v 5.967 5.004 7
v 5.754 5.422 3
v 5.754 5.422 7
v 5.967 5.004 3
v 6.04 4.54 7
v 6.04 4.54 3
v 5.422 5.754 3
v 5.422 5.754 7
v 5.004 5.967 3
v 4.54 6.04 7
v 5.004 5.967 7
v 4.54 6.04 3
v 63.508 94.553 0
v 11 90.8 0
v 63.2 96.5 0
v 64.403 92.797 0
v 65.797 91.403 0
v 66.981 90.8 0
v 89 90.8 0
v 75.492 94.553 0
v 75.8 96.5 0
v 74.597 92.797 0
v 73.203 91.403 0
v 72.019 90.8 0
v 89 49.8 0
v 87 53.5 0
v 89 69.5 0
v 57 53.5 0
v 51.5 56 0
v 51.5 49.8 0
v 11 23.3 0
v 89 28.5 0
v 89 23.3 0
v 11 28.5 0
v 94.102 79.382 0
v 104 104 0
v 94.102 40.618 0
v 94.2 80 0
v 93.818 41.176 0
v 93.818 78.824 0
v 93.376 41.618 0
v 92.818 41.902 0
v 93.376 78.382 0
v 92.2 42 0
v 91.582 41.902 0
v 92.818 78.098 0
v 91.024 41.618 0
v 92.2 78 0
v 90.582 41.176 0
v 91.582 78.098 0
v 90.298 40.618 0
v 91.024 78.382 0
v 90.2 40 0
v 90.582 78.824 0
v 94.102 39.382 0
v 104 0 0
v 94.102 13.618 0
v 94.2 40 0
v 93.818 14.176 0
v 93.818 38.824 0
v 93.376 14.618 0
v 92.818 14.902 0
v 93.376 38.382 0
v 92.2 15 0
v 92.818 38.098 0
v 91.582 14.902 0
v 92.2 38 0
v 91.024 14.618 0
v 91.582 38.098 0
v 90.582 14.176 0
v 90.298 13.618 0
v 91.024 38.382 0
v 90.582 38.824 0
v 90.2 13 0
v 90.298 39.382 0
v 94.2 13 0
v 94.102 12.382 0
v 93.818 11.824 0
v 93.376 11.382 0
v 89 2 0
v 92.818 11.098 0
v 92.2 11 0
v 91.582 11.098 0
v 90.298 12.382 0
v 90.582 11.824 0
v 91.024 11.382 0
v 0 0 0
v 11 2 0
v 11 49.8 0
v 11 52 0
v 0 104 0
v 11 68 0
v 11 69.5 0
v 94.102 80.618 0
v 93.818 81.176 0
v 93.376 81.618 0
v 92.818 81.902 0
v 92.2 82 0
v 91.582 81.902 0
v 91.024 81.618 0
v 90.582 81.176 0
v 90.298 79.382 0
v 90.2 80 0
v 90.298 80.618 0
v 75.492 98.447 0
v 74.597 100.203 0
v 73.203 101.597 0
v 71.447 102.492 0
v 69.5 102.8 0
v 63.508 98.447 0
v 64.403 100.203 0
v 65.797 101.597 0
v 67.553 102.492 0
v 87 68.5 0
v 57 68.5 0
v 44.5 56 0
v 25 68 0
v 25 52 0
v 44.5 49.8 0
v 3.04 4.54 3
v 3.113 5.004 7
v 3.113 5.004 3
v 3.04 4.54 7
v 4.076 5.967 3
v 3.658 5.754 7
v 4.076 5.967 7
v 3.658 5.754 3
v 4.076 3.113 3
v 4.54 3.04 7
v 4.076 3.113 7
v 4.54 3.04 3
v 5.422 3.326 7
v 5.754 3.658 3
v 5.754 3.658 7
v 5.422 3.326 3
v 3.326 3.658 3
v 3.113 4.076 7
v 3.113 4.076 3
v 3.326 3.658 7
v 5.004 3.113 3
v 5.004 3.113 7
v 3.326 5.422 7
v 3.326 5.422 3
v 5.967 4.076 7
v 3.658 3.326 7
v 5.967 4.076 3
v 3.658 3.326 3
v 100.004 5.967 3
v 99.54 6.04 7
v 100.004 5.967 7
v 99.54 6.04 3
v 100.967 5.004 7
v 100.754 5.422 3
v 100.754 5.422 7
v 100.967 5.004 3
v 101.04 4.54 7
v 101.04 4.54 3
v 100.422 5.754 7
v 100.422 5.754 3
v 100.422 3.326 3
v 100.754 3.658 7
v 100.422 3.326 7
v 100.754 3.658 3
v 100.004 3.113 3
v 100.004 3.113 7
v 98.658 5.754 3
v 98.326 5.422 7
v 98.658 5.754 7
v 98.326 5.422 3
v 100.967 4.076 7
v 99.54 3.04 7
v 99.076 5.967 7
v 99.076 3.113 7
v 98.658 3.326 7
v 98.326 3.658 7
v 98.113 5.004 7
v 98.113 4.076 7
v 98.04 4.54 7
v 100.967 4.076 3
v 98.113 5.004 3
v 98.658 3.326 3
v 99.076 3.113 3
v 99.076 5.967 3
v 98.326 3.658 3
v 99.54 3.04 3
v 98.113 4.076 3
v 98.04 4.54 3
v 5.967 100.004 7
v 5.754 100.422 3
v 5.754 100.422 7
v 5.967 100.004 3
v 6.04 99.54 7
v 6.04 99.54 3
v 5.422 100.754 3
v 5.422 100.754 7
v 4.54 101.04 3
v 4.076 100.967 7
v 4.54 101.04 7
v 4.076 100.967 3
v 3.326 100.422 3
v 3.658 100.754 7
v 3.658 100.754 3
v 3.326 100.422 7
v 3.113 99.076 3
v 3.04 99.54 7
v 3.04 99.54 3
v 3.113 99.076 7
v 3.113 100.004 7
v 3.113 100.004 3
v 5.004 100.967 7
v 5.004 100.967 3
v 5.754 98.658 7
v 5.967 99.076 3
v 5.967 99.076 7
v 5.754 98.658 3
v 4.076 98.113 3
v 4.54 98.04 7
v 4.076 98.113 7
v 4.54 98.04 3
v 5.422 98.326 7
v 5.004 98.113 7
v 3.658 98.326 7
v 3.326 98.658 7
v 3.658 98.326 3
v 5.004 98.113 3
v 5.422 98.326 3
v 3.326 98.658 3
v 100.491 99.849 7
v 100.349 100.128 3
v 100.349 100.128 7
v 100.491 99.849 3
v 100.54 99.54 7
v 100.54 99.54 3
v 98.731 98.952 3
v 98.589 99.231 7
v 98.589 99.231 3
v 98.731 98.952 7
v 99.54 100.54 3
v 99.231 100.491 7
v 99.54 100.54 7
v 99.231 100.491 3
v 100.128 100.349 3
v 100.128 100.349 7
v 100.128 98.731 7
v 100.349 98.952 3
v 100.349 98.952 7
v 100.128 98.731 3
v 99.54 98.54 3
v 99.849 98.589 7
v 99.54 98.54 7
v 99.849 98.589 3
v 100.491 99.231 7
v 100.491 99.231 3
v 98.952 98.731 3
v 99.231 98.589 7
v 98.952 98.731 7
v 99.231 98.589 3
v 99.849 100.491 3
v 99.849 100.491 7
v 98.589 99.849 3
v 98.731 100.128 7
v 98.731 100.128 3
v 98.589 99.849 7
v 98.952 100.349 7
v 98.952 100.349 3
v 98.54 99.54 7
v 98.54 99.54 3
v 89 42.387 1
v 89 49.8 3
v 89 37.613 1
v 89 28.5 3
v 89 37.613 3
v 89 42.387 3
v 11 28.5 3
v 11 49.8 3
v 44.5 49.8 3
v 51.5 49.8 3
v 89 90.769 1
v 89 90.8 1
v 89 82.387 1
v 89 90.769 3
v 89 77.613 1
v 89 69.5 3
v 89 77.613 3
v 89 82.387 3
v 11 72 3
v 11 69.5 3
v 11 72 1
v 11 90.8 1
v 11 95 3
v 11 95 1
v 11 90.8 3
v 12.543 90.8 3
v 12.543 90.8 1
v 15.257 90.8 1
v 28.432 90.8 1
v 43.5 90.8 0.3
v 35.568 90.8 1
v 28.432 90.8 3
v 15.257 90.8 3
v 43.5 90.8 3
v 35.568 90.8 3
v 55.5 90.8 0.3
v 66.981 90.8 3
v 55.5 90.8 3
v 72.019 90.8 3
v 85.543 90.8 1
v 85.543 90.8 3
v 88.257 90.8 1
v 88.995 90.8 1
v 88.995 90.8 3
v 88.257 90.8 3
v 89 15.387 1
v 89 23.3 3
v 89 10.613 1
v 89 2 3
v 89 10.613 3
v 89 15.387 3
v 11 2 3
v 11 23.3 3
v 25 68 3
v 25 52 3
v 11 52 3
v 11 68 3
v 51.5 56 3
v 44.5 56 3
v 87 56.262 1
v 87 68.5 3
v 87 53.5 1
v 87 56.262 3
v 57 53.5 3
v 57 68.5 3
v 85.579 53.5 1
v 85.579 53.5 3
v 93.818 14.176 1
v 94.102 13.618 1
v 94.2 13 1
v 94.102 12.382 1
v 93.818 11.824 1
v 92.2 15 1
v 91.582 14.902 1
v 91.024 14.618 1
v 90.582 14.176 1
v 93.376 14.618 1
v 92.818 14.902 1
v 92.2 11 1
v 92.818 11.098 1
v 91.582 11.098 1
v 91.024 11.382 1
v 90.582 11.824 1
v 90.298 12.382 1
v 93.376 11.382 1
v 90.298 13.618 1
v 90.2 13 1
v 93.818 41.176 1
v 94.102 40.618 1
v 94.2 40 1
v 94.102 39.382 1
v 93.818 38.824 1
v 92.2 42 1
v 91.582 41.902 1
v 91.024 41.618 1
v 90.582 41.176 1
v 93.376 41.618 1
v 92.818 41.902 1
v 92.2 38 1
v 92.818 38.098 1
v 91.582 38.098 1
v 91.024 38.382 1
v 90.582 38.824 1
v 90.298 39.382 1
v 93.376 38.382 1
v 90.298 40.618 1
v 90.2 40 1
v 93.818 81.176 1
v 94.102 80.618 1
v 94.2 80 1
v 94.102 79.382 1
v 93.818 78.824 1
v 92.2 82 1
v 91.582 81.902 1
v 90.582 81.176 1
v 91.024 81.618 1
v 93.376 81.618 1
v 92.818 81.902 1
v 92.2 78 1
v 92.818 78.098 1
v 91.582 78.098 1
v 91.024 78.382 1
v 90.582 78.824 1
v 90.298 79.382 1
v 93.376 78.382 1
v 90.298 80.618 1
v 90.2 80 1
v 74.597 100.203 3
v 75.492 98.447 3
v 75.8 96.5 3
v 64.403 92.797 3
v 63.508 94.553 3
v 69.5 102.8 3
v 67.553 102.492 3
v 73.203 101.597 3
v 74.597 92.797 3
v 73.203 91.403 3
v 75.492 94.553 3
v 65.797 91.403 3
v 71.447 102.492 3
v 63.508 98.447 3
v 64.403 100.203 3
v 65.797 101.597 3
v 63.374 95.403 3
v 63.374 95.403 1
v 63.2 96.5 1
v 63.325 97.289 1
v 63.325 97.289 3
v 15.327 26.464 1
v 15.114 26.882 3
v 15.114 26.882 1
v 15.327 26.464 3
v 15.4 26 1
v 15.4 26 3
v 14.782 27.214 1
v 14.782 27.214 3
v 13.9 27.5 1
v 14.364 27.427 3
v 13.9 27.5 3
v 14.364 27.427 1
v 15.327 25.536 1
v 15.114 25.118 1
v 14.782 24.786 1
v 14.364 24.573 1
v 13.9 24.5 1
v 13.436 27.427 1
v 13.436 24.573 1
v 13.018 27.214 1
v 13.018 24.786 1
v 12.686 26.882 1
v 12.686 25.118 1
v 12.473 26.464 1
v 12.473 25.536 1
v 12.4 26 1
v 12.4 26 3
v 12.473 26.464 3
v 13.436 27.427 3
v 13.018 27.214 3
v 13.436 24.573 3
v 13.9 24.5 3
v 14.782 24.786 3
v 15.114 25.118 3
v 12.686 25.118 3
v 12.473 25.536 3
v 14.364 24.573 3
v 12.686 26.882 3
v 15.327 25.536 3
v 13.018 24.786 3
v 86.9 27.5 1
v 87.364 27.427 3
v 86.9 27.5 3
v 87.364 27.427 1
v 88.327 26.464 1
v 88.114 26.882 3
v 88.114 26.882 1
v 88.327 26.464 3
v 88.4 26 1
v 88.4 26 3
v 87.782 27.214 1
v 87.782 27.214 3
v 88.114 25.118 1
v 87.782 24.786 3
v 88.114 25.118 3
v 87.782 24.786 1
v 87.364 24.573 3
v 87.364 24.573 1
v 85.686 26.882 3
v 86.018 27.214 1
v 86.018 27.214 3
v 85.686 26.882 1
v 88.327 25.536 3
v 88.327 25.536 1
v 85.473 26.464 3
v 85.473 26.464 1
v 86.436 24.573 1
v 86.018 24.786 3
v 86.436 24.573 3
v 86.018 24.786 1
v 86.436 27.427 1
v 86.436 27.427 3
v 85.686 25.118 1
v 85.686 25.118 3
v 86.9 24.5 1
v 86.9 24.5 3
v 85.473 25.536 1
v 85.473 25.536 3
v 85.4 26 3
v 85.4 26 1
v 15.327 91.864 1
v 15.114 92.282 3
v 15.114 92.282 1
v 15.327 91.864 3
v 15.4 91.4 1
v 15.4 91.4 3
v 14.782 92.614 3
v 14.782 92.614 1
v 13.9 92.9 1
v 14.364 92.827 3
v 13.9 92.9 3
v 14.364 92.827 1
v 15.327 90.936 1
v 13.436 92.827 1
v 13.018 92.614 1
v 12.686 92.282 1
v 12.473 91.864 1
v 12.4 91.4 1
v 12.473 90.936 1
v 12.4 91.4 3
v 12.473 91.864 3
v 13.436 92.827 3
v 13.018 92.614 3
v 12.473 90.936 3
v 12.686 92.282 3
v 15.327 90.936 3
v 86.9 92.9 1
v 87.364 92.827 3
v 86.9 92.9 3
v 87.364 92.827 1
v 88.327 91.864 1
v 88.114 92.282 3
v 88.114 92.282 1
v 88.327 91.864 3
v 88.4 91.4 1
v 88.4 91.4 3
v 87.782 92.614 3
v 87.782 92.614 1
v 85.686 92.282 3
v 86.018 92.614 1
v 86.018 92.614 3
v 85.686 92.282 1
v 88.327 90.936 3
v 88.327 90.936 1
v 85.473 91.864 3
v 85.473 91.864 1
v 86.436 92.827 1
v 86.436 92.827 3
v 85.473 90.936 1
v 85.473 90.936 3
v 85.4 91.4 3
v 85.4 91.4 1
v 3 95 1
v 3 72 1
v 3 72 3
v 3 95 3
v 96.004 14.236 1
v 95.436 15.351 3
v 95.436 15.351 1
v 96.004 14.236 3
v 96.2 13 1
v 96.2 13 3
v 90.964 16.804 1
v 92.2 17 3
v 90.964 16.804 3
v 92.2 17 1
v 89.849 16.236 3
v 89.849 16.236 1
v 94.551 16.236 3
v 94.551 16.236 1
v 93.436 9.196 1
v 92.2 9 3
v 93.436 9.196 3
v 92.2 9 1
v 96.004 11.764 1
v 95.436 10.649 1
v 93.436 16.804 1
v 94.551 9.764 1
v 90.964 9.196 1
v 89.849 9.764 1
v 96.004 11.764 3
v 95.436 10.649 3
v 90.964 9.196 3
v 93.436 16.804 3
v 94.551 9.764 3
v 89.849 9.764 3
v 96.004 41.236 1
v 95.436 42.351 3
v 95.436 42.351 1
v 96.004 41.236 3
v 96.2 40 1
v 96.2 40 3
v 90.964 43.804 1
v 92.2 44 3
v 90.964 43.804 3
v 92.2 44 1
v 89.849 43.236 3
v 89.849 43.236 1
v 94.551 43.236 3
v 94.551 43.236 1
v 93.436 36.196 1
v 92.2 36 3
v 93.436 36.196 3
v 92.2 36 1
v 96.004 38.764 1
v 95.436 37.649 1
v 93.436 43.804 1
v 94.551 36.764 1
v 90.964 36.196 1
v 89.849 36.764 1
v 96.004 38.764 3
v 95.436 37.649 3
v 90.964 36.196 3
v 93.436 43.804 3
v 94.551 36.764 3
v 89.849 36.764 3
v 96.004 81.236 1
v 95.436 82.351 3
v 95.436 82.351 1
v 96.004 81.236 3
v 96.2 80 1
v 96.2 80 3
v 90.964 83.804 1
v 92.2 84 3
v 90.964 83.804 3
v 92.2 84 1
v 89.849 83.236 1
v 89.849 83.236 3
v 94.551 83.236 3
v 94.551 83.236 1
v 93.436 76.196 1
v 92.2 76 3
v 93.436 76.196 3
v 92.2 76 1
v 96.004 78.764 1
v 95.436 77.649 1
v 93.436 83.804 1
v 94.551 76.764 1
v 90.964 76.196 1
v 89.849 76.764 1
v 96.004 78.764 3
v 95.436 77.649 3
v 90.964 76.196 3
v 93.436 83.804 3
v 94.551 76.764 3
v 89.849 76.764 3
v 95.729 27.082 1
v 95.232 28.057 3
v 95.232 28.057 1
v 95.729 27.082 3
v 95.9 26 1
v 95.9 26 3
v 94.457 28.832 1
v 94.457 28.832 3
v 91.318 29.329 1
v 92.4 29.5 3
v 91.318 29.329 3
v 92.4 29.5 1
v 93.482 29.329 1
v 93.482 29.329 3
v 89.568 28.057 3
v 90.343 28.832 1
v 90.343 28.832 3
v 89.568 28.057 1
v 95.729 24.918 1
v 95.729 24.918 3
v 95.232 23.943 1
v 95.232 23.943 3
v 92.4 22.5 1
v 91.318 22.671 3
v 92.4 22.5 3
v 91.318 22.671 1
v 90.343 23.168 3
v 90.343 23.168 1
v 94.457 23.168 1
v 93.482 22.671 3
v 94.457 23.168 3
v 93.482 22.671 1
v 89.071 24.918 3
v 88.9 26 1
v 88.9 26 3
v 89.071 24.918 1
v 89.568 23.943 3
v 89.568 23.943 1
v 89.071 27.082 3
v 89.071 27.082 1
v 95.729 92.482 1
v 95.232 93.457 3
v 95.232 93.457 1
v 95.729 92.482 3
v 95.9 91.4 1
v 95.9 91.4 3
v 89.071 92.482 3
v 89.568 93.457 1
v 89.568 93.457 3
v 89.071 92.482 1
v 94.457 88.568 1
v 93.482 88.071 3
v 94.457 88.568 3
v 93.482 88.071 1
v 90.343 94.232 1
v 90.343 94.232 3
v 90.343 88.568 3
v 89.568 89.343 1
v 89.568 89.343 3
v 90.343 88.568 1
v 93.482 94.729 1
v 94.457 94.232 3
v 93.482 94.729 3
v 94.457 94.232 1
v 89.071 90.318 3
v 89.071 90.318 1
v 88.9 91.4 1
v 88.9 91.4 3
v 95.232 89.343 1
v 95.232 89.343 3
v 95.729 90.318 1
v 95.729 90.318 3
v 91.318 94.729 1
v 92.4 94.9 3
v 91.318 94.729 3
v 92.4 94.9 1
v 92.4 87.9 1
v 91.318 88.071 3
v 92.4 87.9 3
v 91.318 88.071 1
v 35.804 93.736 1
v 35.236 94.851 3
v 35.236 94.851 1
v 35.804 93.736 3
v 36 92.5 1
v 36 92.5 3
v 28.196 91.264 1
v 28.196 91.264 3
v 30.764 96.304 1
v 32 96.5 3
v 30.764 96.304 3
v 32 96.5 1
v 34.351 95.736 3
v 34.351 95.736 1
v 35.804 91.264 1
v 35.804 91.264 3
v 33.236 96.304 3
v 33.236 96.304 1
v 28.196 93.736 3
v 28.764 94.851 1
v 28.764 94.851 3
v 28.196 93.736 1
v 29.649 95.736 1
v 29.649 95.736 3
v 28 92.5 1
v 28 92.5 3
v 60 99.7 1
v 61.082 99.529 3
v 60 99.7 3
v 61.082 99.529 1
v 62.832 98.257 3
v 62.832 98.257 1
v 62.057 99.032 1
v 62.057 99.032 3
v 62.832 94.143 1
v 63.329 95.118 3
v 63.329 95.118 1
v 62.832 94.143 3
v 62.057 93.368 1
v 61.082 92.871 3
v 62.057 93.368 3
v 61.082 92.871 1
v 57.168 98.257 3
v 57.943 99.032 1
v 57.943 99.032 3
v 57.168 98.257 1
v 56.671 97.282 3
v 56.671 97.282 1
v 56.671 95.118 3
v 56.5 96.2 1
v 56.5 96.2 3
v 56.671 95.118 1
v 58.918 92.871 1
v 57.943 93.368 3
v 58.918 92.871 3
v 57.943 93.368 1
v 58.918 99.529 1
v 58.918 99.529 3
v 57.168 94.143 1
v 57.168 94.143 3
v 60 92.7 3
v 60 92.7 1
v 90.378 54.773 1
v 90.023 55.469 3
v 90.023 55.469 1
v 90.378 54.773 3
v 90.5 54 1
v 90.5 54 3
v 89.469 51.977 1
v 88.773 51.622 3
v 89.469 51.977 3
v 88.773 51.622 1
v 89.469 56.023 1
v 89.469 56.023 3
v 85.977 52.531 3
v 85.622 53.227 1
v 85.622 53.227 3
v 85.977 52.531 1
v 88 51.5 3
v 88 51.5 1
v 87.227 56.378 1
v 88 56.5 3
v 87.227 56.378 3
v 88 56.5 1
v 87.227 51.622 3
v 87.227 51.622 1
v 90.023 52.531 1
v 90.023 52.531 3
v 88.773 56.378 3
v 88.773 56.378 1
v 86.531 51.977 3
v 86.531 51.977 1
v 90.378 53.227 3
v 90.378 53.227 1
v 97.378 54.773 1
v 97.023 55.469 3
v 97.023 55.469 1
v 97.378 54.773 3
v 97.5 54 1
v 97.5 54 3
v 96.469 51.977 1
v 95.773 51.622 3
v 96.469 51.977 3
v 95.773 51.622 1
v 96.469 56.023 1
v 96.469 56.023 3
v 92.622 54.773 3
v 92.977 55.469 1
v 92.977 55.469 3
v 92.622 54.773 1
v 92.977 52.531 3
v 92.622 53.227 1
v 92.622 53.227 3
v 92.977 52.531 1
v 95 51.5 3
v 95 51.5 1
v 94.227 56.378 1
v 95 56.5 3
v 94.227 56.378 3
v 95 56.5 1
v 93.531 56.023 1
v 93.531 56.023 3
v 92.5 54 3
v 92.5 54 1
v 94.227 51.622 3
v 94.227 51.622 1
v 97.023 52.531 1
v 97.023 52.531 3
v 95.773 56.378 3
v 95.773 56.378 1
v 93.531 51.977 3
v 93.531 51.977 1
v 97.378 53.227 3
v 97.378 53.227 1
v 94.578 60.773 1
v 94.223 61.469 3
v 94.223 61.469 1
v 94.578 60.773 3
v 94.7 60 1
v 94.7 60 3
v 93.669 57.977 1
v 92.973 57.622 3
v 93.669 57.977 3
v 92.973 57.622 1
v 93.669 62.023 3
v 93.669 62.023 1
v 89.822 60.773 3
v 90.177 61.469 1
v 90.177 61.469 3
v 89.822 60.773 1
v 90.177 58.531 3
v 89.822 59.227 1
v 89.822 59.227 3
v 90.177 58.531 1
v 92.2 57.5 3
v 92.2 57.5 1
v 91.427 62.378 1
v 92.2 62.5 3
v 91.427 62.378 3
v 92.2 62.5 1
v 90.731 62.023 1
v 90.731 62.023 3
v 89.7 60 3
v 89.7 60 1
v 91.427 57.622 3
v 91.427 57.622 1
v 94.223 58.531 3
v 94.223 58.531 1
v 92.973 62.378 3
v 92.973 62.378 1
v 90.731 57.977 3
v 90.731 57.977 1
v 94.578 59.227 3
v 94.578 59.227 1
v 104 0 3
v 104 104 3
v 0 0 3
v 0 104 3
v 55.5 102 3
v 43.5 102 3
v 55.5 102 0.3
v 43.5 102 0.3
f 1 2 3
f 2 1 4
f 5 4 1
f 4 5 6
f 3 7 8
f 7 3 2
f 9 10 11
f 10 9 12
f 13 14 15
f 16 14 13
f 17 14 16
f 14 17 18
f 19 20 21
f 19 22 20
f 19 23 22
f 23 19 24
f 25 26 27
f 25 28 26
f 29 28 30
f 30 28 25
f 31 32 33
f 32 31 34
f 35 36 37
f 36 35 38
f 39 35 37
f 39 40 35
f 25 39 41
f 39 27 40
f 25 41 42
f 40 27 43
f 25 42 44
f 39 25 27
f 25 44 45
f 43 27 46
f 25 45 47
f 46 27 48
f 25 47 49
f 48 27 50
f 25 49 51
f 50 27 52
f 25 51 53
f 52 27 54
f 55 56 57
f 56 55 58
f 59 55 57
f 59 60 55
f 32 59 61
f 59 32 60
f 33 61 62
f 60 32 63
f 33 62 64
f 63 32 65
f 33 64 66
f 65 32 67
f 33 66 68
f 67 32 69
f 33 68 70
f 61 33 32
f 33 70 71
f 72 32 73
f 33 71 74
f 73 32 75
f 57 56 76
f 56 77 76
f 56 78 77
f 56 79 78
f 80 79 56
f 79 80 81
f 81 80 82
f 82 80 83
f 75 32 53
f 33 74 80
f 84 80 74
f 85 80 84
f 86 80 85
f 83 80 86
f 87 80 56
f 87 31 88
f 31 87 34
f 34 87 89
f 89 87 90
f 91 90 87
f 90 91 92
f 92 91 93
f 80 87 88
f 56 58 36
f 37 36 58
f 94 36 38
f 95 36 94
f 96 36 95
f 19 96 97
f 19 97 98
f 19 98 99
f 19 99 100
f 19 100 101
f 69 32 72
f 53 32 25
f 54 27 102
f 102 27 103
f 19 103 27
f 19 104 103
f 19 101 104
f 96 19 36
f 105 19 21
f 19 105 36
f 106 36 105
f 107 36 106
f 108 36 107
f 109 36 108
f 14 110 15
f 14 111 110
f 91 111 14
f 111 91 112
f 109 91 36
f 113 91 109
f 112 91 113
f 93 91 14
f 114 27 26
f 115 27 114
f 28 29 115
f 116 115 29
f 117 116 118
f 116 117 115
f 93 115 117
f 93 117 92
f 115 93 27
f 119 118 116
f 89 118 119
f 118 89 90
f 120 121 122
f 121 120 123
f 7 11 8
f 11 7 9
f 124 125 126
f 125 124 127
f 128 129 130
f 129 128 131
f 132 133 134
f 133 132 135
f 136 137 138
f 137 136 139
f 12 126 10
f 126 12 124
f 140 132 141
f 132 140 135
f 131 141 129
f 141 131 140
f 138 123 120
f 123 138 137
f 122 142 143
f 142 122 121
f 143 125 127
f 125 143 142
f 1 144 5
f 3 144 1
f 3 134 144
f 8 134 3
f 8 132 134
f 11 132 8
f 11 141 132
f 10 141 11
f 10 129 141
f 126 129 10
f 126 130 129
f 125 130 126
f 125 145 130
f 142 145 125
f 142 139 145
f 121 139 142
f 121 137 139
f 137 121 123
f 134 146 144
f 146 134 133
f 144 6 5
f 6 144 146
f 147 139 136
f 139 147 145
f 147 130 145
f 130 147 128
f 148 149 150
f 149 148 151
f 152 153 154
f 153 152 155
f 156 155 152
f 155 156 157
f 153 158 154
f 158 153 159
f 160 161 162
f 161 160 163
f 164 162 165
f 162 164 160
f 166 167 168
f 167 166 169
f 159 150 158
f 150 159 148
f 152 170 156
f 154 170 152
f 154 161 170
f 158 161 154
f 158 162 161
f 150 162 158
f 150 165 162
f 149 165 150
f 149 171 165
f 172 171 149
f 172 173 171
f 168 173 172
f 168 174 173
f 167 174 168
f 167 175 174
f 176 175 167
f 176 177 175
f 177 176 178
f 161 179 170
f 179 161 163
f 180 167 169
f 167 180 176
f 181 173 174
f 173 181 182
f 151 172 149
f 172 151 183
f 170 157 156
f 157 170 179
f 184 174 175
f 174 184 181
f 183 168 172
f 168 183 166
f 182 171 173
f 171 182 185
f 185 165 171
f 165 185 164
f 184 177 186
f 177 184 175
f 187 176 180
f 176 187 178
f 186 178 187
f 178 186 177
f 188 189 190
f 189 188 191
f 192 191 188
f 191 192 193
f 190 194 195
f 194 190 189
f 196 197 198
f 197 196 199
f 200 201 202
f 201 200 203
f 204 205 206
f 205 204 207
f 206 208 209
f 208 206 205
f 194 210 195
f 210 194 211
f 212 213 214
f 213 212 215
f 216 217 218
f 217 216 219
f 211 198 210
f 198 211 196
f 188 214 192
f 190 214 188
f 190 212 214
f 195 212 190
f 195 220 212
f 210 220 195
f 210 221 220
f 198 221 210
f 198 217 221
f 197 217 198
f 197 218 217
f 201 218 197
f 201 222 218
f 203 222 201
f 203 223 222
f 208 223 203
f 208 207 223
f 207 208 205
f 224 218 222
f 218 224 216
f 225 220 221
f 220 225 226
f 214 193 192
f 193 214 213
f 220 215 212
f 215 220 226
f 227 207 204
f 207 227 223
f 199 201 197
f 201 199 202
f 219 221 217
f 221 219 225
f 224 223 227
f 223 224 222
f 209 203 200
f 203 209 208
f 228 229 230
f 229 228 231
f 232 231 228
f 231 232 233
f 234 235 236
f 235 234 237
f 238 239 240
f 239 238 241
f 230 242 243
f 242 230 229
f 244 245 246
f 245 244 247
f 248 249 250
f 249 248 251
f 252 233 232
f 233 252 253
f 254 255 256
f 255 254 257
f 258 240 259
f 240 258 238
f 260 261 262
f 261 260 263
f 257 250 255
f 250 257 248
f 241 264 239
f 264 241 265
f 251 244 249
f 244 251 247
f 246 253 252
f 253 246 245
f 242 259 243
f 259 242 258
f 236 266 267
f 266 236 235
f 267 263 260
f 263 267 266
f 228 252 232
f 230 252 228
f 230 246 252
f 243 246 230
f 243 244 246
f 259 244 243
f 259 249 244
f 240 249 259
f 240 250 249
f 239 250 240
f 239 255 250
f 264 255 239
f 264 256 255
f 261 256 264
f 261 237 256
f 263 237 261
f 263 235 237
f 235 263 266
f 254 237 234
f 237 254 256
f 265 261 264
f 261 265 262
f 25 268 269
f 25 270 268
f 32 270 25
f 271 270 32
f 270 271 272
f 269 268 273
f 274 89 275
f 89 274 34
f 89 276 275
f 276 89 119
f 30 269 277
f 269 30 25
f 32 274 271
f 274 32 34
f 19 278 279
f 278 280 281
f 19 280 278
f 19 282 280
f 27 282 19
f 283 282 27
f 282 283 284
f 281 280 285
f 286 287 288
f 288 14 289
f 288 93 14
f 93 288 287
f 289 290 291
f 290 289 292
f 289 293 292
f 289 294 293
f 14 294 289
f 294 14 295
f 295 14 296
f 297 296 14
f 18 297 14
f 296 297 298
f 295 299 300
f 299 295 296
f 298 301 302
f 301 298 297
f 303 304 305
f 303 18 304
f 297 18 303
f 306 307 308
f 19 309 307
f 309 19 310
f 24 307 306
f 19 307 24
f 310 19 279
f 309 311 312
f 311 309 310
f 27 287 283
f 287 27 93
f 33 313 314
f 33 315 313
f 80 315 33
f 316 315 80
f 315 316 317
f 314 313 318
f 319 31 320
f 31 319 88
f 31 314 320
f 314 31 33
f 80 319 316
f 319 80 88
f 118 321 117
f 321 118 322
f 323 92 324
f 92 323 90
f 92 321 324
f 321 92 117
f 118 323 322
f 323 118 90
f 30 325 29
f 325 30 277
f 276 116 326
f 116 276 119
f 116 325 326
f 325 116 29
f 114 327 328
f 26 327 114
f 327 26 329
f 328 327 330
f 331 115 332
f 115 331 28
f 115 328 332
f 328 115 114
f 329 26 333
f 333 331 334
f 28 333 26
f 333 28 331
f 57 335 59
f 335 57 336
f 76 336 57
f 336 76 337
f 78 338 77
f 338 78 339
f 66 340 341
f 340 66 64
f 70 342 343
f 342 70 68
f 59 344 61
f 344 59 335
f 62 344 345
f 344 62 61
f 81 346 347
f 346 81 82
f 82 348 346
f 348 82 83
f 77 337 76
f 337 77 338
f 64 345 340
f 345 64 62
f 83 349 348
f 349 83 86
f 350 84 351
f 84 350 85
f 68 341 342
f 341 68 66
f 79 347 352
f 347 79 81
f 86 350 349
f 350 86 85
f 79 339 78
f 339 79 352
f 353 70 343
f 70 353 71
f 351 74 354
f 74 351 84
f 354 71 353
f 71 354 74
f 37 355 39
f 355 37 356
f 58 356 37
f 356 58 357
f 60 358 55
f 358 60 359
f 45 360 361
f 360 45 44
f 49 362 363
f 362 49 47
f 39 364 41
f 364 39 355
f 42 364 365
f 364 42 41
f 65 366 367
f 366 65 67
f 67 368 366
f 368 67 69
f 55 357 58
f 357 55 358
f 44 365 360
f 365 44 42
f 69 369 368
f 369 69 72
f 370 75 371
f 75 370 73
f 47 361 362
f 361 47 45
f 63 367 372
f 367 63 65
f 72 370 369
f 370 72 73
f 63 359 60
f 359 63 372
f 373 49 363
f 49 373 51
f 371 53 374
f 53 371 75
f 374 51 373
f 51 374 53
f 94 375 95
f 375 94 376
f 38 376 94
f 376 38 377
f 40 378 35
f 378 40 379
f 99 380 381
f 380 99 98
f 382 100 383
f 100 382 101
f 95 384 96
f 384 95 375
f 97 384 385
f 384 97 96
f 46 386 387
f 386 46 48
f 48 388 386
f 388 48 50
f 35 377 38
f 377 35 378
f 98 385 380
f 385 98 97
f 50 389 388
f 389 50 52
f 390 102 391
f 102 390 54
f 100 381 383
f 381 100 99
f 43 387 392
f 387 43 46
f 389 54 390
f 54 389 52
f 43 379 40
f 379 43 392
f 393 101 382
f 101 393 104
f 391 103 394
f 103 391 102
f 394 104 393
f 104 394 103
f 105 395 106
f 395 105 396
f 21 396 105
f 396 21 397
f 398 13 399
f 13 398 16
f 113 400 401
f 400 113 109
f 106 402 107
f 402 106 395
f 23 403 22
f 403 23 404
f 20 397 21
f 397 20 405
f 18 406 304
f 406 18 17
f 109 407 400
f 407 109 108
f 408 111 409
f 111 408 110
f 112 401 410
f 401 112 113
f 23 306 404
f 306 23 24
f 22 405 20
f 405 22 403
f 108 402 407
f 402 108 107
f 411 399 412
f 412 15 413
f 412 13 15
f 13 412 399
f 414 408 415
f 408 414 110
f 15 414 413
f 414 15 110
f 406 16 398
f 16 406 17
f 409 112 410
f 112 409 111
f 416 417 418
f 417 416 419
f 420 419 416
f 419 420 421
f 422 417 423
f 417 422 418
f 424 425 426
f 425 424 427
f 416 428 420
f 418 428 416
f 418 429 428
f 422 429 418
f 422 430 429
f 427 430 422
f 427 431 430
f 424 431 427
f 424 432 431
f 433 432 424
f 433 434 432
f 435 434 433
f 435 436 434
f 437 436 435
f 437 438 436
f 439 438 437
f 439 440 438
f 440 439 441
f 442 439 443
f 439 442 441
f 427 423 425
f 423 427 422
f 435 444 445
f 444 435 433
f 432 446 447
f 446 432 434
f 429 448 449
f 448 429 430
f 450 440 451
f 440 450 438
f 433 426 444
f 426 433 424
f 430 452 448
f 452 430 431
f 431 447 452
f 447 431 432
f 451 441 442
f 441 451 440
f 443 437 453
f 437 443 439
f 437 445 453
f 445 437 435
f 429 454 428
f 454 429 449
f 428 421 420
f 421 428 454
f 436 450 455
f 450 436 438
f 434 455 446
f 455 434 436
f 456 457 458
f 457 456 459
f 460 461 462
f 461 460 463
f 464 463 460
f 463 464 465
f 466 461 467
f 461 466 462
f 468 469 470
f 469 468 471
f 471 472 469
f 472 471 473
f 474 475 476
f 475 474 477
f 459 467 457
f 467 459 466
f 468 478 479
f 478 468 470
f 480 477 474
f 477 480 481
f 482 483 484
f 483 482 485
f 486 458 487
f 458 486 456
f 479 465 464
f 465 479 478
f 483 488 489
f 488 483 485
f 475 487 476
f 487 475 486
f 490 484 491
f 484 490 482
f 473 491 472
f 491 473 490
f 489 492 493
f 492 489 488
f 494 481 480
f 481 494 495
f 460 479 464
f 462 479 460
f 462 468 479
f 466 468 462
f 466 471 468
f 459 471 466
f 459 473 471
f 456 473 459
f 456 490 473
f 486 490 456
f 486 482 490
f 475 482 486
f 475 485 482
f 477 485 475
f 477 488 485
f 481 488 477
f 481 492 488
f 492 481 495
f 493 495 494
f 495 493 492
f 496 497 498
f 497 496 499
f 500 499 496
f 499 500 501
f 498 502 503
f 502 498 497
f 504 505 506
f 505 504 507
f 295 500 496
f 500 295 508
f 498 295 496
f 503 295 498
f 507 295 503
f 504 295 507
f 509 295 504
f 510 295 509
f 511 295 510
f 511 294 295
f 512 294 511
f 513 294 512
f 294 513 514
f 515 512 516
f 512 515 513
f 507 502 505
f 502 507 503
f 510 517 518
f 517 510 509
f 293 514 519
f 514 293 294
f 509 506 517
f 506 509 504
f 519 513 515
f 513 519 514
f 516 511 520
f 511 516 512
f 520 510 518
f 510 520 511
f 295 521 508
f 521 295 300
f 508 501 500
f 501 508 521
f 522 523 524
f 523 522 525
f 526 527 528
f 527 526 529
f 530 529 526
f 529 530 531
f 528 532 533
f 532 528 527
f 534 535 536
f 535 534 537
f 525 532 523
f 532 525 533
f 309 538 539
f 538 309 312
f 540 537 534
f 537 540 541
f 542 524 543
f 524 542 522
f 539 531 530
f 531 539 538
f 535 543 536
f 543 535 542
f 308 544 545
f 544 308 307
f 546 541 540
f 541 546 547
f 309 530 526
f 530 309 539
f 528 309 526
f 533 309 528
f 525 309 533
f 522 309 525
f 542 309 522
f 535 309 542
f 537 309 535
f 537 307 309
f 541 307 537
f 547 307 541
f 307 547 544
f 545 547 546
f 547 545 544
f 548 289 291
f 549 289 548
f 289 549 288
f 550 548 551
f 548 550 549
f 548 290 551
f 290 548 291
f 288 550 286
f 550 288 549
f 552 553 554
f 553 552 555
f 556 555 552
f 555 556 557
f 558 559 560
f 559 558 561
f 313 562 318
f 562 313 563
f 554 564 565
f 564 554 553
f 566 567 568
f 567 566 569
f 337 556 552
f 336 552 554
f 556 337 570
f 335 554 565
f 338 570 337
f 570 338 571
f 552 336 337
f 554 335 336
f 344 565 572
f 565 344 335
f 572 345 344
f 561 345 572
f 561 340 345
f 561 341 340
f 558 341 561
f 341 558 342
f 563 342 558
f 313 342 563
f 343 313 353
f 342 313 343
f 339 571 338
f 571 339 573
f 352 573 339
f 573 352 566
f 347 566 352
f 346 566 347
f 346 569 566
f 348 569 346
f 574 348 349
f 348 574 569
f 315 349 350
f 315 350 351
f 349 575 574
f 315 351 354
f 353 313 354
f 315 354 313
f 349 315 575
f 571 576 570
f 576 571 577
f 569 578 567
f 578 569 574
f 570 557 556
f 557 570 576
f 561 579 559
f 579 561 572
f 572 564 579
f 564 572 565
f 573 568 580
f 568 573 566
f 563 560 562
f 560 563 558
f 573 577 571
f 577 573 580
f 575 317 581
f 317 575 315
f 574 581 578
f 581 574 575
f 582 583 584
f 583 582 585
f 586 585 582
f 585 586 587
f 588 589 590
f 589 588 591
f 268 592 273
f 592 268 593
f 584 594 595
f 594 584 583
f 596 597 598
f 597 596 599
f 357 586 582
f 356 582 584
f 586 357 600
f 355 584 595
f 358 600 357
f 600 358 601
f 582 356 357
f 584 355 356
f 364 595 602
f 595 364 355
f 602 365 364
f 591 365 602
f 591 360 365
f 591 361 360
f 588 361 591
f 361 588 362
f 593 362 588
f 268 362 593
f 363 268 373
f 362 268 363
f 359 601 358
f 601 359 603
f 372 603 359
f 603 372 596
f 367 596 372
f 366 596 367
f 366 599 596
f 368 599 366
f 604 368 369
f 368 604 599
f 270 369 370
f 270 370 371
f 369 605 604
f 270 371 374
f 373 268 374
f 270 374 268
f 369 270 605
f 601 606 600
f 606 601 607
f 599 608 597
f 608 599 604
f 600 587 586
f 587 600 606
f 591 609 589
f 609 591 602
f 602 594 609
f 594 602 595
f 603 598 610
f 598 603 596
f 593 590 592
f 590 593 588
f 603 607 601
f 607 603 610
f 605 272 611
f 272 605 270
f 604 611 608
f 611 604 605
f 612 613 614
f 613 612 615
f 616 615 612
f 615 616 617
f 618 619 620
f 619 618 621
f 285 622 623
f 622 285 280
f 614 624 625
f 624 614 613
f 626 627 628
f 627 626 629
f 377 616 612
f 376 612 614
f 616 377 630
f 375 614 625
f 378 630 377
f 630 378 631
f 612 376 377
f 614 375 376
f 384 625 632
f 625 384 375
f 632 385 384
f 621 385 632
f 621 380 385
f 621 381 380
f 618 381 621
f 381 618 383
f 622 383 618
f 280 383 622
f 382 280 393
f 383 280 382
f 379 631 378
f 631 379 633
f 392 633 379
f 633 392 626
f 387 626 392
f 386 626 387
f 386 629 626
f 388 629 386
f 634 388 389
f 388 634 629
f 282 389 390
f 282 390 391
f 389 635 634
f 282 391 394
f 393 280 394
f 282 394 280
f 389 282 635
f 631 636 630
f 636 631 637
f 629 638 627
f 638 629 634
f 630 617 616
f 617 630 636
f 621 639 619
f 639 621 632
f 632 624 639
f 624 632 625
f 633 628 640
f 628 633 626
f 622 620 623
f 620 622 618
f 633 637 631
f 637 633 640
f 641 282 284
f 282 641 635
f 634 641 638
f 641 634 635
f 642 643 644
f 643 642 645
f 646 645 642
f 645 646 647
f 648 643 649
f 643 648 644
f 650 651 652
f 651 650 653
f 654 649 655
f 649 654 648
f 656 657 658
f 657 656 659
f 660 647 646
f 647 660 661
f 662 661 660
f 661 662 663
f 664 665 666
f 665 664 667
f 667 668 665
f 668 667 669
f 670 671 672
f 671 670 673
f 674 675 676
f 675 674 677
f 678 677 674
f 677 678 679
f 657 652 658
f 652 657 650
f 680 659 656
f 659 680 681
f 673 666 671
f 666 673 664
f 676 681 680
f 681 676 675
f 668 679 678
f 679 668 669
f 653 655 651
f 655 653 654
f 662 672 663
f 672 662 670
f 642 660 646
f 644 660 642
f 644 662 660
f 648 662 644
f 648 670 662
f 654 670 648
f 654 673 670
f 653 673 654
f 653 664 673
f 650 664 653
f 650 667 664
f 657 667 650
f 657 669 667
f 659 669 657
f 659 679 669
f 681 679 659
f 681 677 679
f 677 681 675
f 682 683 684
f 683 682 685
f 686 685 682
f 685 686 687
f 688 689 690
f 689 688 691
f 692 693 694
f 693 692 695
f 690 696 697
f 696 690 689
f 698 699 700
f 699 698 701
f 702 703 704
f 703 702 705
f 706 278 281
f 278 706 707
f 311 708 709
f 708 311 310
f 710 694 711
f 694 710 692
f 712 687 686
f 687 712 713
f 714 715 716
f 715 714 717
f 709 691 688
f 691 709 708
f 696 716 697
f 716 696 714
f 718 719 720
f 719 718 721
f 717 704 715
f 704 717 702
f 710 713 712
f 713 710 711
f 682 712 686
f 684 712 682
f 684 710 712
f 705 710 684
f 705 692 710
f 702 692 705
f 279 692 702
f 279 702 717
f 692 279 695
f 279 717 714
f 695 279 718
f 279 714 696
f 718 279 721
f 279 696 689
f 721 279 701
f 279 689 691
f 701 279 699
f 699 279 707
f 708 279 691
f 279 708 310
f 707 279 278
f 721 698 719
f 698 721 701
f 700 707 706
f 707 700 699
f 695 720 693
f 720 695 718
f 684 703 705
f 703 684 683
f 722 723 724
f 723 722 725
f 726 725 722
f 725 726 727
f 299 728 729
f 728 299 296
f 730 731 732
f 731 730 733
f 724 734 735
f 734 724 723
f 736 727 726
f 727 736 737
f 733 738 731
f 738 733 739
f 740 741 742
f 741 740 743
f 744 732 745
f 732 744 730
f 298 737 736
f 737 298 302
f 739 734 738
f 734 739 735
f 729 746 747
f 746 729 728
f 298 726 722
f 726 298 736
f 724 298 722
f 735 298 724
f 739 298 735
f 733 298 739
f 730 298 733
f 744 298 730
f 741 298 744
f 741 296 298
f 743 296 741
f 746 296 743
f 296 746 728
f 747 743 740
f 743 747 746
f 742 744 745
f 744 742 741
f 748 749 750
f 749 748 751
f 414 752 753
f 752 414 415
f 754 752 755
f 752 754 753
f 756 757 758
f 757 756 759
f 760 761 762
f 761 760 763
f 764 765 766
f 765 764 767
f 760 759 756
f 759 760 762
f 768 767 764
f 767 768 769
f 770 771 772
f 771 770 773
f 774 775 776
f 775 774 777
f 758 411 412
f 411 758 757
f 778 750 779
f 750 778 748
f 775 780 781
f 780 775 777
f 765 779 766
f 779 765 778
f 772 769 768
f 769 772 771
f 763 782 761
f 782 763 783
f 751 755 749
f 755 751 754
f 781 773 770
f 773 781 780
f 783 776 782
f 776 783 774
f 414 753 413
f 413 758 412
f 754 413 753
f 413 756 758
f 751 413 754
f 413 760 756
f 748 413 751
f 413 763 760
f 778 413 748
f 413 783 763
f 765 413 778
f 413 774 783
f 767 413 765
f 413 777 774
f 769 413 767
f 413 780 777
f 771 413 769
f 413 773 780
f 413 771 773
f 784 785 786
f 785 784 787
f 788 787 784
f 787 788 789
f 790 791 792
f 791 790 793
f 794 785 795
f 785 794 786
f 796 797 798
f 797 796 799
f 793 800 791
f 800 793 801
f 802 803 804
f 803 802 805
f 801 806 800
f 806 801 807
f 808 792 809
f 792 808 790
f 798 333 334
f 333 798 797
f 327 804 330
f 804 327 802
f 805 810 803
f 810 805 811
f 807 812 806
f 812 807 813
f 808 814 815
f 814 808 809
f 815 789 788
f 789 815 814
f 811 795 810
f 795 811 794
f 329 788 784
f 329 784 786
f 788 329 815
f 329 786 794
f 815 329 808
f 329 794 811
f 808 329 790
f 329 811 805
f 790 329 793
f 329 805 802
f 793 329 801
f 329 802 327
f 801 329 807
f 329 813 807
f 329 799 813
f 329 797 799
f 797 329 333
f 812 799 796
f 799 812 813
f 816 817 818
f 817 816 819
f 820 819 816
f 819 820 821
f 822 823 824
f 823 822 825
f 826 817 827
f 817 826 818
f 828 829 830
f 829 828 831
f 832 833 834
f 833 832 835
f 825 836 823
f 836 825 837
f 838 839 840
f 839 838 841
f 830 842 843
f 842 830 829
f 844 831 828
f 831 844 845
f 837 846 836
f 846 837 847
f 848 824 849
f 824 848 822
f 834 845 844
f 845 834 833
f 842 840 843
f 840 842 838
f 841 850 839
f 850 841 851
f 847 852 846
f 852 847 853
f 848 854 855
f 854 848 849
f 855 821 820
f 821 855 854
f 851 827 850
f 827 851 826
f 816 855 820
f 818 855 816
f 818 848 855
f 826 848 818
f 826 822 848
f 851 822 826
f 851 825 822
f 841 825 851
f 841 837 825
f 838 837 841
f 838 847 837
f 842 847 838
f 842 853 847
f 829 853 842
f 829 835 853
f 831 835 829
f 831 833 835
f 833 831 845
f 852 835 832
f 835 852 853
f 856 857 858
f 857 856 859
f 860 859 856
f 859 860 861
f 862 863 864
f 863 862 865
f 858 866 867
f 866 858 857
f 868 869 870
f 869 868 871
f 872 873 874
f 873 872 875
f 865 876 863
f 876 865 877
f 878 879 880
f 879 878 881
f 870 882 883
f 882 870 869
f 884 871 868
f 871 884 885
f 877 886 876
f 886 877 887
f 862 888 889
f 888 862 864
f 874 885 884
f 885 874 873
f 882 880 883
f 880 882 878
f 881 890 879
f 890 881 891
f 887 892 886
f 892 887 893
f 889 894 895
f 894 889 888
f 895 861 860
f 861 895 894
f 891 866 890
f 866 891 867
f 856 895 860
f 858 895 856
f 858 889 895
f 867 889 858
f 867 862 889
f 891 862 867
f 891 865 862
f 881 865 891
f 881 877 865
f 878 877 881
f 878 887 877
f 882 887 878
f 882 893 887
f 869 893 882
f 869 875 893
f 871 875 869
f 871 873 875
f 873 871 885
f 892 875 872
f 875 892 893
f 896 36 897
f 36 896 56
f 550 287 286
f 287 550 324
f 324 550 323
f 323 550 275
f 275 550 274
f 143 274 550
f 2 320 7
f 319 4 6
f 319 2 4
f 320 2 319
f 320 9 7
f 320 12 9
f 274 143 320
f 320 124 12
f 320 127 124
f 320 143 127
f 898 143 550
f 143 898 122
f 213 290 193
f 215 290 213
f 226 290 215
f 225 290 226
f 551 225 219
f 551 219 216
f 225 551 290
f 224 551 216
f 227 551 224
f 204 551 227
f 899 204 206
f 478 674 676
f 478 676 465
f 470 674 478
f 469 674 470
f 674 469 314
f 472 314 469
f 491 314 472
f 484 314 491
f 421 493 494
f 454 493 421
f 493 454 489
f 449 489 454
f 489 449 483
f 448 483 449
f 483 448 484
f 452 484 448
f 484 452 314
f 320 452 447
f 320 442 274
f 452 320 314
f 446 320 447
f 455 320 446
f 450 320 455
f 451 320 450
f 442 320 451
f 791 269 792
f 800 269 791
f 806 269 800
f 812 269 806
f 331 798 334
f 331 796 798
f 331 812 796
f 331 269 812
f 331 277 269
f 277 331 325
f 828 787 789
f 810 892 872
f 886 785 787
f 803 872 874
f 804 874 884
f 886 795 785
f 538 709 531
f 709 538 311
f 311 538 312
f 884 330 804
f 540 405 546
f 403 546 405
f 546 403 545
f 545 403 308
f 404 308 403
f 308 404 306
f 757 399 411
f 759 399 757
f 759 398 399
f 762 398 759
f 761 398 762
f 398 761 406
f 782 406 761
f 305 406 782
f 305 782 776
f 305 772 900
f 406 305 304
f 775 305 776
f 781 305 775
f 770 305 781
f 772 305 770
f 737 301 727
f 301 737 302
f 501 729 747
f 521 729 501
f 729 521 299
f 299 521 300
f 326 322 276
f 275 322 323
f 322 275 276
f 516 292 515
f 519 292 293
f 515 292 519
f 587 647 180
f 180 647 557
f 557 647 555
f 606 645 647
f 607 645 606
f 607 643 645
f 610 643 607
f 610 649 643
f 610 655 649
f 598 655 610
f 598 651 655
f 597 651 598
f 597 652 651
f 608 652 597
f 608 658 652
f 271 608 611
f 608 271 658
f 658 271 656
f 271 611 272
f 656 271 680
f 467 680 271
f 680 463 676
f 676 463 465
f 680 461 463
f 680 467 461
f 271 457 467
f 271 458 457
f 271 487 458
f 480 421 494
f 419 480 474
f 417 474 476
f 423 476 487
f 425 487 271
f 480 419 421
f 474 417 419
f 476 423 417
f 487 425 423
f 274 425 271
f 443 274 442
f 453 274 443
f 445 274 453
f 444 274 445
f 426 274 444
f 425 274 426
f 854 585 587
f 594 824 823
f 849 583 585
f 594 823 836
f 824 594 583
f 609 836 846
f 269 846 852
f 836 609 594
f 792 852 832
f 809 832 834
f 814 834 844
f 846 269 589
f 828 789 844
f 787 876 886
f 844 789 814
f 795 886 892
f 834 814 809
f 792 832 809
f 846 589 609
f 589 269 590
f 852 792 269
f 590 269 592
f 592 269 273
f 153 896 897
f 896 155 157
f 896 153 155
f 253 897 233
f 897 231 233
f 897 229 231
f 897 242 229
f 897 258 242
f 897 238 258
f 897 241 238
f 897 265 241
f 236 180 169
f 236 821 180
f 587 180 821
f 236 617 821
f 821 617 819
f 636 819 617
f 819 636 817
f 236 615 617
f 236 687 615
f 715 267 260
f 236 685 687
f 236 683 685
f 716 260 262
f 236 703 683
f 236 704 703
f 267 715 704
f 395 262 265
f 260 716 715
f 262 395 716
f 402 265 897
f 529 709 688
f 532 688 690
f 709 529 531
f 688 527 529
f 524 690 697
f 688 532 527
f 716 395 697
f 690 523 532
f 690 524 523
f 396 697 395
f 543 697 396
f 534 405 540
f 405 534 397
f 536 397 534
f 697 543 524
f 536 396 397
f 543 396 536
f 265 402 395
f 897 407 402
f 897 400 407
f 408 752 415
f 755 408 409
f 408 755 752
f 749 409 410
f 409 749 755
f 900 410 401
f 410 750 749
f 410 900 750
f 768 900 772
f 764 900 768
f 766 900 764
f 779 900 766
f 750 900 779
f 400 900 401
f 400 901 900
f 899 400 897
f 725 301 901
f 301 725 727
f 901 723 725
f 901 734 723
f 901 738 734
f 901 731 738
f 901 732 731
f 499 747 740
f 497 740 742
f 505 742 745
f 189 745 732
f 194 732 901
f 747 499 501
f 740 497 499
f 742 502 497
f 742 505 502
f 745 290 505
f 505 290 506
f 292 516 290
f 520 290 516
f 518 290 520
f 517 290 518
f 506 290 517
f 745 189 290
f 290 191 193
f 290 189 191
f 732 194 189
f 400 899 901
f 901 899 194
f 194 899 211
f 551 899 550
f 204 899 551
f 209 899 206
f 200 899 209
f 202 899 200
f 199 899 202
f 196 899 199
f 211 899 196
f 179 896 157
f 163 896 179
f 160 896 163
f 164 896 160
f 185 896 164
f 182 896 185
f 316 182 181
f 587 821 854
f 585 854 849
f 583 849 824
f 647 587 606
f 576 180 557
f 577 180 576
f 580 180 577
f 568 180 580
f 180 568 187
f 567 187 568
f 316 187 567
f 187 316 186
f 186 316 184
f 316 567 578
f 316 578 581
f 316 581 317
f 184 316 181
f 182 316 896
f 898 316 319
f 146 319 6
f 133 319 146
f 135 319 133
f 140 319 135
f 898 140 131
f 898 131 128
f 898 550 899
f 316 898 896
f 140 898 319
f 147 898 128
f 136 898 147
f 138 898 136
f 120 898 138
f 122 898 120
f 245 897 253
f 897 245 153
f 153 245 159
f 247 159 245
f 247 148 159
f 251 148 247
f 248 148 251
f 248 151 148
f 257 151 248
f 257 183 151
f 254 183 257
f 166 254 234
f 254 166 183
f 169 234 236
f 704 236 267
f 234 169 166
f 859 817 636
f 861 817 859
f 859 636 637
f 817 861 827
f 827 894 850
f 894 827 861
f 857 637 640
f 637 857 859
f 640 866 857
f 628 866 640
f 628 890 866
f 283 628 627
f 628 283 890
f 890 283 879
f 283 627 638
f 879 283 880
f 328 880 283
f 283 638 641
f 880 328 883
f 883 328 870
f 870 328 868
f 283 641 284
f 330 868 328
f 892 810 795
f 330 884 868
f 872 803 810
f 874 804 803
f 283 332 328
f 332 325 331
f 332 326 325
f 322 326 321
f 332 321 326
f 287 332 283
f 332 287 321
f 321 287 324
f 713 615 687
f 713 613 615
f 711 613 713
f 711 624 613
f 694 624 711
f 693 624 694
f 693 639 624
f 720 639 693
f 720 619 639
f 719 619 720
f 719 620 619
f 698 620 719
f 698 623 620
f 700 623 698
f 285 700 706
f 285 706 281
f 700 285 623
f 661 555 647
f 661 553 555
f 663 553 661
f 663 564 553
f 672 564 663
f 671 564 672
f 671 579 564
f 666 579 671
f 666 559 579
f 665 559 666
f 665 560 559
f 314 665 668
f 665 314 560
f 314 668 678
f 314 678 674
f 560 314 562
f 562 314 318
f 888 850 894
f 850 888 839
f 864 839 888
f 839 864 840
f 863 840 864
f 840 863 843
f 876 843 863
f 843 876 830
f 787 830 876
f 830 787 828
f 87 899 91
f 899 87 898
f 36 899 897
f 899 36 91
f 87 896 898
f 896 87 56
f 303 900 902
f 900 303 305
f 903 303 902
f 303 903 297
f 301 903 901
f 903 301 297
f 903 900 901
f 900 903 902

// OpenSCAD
$fn=20;
pcbx=100;
pcby=100;
bh=2;

translate([bh,bh,0])
translate([2.54,2.54,0]) {
 cylinder(h=7,r=1.5);
translate([95,0,0]) 
 cylinder(h=7,r=1.5);
translate([0,95,0]) 
 cylinder(h=7,r=1.5);
translate([95,95,0]) 
 cylinder(h=7,r=1.);
}
difference(){
cube([pcbx+bh+bh,pcby+bh+bh,3]);
translate([bh,bh,0]) {


translate([9,26.5,0]) cube([78,21.3,4]); //B3
translate([9,67.5,0]) cube([78,21.3,4]); //B4
translate([9,0,0]) cube([78,21.3,4]);  //b5
translate([9,50,0]) cube([18-4,16,4]);   //label !001
translate([46,50+0.5,0]) cube([7,7,4*2],true);  // reset switch  y=50 !001
translate([55,51.5,0]) cube([32-2,15,4]);  //usbcom !100

translate([90.2,10.5+0.5,0]) cylinder(h=4,r=2);//led3 !001
translate([90.2,37+1,0]) cylinder(h=4,r=2);//led4  !001
translate([90.2,77.5+0.5,0]) cylinder(h=4,r=2);//led5 !001

translate([66+1.5,94.5,0]) cylinder(h=4,r=6.3);//bat !001
}
translate([bh,bh,0.3]){
translate([41.5,88,0]) cube([12,12,4]);//U9
}
translate([bh,bh,1]){
translate([1,70,0]) cube([8,23,4]); //s2 s3

translate([90.2,10.5+0.5,0]) cylinder(h=4,r=4);//led3 !001
translate([90.2,37+1,0]) cylinder(h=4,r=4);//led4 !001
translate([90.2,77.5+0.5,0]) cylinder(h=4,r=4);//led5 !001

translate([11.9,100-76,0])  {
cylinder(h=4,r=1.5);//B2
translate([73,0,0]) cylinder(h=4,r=1.5);//B2
}

translate([11.9,100-10.6,0])  {
cylinder(h=4,r=1.5);//B1
translate([73,0,0]) cylinder(h=4,r=1.5);//B1
}

translate([90.4,100-76,0]) cylinder(h=4,r=3.5);//led2
translate([90.4,100-10.6,0]) cylinder(h=4,r=3.5);//led1

translate([30,100-9.5,0]) cylinder(h=4,r=4);//r24,r3

translate([58,100-5.8,0]) cylinder(h=4,r=3.5);//d1

translate([86,100-48,0]) cylinder(h=4,r=2.5);//power
translate([93,100-48,0]) cylinder(h=4,r=2.5);//power
translate([90.2,100-42,0]) cylinder(h=4,r=2.5);//power
}
}
